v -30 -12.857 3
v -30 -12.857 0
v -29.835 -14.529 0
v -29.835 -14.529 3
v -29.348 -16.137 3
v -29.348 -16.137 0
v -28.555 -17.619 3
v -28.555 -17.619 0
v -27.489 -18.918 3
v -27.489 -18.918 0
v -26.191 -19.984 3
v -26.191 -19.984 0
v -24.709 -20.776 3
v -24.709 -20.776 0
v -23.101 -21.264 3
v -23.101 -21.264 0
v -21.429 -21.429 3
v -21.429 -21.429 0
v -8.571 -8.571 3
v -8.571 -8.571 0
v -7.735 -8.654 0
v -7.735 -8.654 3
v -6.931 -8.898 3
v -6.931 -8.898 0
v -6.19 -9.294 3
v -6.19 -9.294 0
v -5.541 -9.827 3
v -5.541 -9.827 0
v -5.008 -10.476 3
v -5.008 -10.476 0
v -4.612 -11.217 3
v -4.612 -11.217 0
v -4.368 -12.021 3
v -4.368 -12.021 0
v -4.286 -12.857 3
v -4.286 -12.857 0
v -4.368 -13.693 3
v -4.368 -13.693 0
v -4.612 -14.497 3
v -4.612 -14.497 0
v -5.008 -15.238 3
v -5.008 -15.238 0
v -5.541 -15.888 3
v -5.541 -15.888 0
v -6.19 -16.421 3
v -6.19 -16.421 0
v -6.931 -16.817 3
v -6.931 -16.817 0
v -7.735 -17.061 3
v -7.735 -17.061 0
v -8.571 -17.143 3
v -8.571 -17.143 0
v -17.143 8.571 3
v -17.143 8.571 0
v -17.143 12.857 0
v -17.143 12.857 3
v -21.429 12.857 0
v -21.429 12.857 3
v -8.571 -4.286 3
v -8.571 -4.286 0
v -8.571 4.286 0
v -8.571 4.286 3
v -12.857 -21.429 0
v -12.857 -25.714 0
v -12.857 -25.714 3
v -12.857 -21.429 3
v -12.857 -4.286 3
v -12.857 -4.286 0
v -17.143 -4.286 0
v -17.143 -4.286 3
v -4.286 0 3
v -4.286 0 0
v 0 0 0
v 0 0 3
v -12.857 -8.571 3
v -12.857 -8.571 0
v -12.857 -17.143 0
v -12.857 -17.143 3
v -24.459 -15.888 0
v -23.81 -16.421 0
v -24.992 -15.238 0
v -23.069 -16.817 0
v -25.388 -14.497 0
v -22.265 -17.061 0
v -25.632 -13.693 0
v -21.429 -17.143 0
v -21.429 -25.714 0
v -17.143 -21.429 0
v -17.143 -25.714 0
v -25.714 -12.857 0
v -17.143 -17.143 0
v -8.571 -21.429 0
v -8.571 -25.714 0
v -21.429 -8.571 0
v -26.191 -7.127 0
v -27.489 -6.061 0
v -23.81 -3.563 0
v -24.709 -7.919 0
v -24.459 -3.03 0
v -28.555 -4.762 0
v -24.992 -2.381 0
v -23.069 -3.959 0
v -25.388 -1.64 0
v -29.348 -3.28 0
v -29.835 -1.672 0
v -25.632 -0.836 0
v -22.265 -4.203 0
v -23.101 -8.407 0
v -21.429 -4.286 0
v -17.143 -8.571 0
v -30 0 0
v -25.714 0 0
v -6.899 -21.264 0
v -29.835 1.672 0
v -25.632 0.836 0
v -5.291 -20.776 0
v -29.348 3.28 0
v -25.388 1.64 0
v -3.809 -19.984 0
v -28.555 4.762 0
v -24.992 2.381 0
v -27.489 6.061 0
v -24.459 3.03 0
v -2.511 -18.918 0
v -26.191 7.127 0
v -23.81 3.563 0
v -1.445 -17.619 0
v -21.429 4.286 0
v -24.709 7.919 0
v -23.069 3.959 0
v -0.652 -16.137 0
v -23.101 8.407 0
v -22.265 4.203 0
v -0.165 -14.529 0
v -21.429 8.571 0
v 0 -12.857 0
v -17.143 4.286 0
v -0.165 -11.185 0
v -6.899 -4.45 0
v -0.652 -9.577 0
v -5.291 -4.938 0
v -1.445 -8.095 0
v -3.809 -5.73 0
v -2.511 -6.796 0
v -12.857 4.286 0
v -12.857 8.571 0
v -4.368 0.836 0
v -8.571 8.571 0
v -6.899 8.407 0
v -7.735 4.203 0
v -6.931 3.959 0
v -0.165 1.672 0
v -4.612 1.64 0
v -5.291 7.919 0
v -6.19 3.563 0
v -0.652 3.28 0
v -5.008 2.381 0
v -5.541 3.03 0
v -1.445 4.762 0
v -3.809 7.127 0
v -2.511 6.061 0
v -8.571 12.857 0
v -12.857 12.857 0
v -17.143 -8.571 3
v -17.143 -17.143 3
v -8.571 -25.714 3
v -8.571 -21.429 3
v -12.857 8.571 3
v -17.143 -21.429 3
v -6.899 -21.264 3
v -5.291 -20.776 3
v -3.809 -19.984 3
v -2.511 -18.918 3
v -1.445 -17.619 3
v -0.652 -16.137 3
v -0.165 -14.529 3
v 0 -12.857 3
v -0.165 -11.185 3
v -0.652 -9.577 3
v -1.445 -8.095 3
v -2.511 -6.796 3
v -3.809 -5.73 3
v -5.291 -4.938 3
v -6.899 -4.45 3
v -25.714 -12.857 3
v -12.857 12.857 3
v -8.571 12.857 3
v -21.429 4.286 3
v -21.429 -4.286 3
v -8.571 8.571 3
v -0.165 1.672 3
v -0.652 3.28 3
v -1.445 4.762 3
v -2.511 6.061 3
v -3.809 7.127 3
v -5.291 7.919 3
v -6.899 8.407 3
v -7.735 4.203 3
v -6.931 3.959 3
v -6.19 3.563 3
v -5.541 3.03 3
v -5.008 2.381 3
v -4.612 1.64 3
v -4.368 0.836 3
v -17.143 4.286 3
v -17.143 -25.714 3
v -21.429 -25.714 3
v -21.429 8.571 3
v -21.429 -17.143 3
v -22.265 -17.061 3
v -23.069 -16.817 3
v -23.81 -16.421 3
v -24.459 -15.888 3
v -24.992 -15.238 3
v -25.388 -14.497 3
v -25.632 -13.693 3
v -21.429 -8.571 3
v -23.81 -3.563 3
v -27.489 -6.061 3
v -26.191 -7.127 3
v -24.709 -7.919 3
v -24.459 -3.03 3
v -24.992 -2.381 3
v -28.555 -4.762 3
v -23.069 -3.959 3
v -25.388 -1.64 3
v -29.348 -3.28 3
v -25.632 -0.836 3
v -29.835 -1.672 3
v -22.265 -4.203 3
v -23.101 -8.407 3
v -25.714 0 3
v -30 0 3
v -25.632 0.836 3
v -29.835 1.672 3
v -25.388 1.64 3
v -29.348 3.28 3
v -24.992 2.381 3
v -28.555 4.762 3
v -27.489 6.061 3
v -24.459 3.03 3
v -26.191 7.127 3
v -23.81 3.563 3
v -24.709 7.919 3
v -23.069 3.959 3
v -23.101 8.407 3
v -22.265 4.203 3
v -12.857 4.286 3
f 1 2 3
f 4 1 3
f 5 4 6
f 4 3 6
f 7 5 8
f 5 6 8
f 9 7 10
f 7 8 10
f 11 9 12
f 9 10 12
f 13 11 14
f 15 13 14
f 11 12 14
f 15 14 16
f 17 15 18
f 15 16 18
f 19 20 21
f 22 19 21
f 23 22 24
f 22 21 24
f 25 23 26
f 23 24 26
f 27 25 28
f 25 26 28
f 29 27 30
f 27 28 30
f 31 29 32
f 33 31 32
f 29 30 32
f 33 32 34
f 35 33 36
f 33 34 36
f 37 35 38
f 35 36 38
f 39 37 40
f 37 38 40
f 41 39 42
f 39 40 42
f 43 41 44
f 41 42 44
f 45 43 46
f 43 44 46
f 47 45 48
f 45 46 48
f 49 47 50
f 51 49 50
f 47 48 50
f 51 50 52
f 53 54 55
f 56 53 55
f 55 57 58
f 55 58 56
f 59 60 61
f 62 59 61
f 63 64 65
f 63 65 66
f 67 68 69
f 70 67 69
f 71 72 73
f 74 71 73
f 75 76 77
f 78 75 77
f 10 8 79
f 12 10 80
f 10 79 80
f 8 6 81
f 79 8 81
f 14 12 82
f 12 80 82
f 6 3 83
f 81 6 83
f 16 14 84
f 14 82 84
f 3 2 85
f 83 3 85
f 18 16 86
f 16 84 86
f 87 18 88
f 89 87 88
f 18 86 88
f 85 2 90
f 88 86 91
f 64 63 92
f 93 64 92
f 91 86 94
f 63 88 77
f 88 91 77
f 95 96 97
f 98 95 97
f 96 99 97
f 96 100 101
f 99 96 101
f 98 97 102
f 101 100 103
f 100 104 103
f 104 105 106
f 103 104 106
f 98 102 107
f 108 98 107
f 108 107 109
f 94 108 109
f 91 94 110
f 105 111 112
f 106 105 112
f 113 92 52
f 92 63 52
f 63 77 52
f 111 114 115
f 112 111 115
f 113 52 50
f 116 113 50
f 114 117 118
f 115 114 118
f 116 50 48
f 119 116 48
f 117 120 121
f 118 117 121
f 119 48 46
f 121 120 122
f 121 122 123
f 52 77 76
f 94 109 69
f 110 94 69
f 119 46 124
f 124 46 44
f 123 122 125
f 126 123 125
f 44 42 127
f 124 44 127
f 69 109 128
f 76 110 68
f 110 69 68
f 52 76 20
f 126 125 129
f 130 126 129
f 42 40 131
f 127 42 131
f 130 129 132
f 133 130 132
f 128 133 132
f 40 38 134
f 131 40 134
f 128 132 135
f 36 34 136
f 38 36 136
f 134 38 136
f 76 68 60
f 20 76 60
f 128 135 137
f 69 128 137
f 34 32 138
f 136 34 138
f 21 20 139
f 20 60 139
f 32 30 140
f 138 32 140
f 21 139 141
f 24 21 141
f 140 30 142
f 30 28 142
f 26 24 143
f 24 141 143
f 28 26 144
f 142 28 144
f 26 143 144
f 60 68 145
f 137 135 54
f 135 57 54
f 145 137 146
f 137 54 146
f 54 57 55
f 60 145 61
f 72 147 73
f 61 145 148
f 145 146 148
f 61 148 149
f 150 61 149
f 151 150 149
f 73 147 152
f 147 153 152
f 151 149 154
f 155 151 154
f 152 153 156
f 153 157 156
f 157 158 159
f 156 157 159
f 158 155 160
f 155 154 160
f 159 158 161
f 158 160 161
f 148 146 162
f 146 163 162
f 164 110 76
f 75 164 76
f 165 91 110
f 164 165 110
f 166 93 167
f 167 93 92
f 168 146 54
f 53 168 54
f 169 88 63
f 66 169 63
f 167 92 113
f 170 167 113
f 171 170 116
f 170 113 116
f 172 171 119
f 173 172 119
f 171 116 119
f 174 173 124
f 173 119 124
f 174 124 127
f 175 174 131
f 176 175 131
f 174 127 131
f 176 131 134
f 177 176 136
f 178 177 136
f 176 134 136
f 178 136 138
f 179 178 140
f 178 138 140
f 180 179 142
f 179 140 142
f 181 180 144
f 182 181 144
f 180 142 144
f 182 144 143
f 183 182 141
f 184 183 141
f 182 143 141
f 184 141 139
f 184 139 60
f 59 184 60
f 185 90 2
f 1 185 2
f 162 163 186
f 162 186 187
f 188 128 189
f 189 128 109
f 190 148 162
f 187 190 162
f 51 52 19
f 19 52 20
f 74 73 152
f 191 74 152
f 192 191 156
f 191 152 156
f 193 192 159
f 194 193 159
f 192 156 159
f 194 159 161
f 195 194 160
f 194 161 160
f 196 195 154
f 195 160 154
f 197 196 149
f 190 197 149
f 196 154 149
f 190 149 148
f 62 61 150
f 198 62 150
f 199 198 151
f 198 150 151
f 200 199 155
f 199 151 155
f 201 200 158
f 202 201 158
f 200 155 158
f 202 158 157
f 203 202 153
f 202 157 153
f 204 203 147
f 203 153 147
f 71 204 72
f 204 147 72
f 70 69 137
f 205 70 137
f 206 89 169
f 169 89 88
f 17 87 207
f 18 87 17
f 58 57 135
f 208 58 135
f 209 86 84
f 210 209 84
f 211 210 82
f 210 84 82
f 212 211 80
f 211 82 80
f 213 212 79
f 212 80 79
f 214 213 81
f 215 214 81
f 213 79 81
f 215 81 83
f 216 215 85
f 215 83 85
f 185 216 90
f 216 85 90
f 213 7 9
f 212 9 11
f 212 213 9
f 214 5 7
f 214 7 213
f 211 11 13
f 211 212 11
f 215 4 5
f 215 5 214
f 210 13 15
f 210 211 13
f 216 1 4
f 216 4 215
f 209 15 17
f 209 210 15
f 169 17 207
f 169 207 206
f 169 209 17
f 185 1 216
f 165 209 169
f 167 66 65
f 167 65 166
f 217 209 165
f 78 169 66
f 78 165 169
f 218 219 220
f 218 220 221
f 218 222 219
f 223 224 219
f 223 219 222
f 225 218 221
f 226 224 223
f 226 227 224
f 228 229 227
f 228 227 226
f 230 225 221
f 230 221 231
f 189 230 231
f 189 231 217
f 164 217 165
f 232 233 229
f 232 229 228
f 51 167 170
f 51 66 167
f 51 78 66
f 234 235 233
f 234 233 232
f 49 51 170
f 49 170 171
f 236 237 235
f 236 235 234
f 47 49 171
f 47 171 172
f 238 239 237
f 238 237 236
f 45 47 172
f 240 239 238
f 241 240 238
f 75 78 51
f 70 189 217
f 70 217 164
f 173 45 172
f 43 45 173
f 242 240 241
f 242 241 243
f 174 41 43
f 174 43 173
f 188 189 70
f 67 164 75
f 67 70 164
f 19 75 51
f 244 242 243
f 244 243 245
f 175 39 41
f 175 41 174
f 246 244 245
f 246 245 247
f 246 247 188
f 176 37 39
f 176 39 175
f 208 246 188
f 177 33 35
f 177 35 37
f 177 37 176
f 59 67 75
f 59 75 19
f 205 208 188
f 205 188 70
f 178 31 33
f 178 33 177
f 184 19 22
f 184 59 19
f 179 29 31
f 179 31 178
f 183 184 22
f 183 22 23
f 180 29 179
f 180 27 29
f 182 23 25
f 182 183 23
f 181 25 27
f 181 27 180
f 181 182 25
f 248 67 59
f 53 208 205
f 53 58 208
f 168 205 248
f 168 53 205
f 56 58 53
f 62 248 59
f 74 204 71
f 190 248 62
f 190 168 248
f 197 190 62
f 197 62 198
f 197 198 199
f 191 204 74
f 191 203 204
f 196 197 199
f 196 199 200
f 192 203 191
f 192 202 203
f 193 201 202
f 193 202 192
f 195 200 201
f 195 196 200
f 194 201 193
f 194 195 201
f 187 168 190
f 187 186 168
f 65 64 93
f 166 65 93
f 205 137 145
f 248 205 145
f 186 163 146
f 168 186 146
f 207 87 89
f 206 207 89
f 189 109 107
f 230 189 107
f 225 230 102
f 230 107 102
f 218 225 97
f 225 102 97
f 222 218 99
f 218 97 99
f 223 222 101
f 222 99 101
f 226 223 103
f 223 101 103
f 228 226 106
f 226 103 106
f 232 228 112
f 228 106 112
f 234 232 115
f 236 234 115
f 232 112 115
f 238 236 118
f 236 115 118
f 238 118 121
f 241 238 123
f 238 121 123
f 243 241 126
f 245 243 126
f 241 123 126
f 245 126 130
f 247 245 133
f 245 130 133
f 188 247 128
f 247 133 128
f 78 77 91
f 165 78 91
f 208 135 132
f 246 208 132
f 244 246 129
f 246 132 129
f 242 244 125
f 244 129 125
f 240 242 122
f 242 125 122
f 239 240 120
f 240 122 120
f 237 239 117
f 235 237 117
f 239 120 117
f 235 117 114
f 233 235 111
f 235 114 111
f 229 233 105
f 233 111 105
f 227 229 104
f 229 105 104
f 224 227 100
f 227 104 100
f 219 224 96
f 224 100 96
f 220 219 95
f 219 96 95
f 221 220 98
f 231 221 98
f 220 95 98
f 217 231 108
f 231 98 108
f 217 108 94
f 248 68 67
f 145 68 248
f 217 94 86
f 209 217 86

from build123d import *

# Parameters (mm, degrees)
F0_W     = 4.2857142857
F0_H     = 4.2857142857
F0_H_2   = 8.5714285714
F1_DEPTH = 3
F2_DEPTH = 3


with BuildPart() as f1:
    # F0 (on Top) → F1 (new body)
    with BuildSketch(Plane.XY):
        with BuildLine():
            ThreePointArc((-8.5714285714, 4.2857142857), (-5.5409709378, 3.0304576337), (-4.2857142857, 0))
            Line((-4.2857142857, 0), (0, 0))
            ThreePointArc((0, 0), (-2.5105133041, 6.0609152673), (-8.5714285714, 8.5714285714))
            Line((-8.5714285714, 8.5714285714), (-8.5714285714, 4.2857142857))
        make_face()
        with Locations((-10.7142857143, 6.4285714286)):
            Rectangle(F0_W, F0_H)
        with Locations((-10.7142857143, 10.7142857143)):
            Rectangle(F0_W, F0_H)
        with Locations((-15, 6.4285714286)):
            Rectangle(F0_W, F0_H)
        with Locations((-10.7142857143, 0)):
            Rectangle(F0_W, F0_H_2)
        Polygon((-17.1428571429, 0), (-17.1428571429, 4.2857142857), (-21.4285714286, 4.2857142857), (-21.4285714286, -4.2857142857), (-17.1428571429, -4.2857142857), align=None)
        with Locations((-19.2857142857, 6.4285714286)):
            Rectangle(F0_W, F0_H)
        with Locations((-19.2857142857, 10.7142857143)):
            Rectangle(F0_W, F0_H)
    extrude(amount=F1_DEPTH)

    # F0 (on Top) → F2 (join)
    with BuildSketch(Plane.XY):
        with BuildLine():
            ThreePointArc((-21.4285714286, -4.2857142857), (-25.7142857143, 0), (-21.4285714286, 4.2857142857))
            Line((-21.4285714286, 4.2857142857), (-21.4285714286, 8.5714285714))
            ThreePointArc((-21.4285714286, 8.5714285714), (-30, 0), (-21.4285714286, -8.5714285714))
            Line((-21.4285714286, -8.5714285714), (-21.4285714286, -4.2857142857))
        make_face()
        with Locations((-19.2857142857, -6.4285714286)):
            Rectangle(F0_W, F0_H)
        with Locations((-19.2857142857, -12.8571428571)):
            Rectangle(F0_W, F0_H_2)
        with BuildLine():
            ThreePointArc((-8.5714285714, -21.4285714286), (0, -12.8571428571), (-8.5714285714, -4.2857142857))
            Line((-8.5714285714, -4.2857142857), (-8.5714285714, -8.5714285714))
            ThreePointArc((-8.5714285714, -8.5714285714), (-4.2857142857, -12.8571428571), (-8.5714285714, -17.1428571429))
            Line((-8.5714285714, -17.1428571429), (-8.5714285714, -21.4285714286))
        make_face()
        with Locations((-10.7142857143, -19.2857142857)):
            Rectangle(F0_W, F0_H)
        with Locations((-15, -19.2857142857)):
            Rectangle(F0_W, F0_H)
        with Locations((-19.2857142857, -19.2857142857)):
            Rectangle(F0_W, F0_H)
        with Locations((-10.7142857143, -6.4285714286)):
            Rectangle(F0_W, F0_H)
        with BuildLine():
            ThreePointArc((-30, -12.8571428571), (-27.4894866959, -18.9180581245), (-21.4285714286, -21.4285714286))
            Line((-21.4285714286, -21.4285714286), (-21.4285714286, -17.1428571429))
            ThreePointArc((-21.4285714286, -17.1428571429), (-24.4590290622, -15.8876004908), (-25.7142857143, -12.8571428571))
            Line((-25.7142857143, -12.8571428571), (-30, -12.8571428571))
        make_face()
        with Locations((-19.2857142857, -23.5714285714)):
            Rectangle(F0_W, F0_H)
        with Locations((-10.7142857143, -23.5714285714)):
            Rectangle(F0_W, F0_H)
        with Locations((-10.7142857143, -12.8571428571)):
            Rectangle(F0_W, F0_H_2)
        with Locations((-15, -6.4285714286)):
            Rectangle(F0_W, F0_H)
    extrude(amount=F2_DEPTH)


solid = f1.part
